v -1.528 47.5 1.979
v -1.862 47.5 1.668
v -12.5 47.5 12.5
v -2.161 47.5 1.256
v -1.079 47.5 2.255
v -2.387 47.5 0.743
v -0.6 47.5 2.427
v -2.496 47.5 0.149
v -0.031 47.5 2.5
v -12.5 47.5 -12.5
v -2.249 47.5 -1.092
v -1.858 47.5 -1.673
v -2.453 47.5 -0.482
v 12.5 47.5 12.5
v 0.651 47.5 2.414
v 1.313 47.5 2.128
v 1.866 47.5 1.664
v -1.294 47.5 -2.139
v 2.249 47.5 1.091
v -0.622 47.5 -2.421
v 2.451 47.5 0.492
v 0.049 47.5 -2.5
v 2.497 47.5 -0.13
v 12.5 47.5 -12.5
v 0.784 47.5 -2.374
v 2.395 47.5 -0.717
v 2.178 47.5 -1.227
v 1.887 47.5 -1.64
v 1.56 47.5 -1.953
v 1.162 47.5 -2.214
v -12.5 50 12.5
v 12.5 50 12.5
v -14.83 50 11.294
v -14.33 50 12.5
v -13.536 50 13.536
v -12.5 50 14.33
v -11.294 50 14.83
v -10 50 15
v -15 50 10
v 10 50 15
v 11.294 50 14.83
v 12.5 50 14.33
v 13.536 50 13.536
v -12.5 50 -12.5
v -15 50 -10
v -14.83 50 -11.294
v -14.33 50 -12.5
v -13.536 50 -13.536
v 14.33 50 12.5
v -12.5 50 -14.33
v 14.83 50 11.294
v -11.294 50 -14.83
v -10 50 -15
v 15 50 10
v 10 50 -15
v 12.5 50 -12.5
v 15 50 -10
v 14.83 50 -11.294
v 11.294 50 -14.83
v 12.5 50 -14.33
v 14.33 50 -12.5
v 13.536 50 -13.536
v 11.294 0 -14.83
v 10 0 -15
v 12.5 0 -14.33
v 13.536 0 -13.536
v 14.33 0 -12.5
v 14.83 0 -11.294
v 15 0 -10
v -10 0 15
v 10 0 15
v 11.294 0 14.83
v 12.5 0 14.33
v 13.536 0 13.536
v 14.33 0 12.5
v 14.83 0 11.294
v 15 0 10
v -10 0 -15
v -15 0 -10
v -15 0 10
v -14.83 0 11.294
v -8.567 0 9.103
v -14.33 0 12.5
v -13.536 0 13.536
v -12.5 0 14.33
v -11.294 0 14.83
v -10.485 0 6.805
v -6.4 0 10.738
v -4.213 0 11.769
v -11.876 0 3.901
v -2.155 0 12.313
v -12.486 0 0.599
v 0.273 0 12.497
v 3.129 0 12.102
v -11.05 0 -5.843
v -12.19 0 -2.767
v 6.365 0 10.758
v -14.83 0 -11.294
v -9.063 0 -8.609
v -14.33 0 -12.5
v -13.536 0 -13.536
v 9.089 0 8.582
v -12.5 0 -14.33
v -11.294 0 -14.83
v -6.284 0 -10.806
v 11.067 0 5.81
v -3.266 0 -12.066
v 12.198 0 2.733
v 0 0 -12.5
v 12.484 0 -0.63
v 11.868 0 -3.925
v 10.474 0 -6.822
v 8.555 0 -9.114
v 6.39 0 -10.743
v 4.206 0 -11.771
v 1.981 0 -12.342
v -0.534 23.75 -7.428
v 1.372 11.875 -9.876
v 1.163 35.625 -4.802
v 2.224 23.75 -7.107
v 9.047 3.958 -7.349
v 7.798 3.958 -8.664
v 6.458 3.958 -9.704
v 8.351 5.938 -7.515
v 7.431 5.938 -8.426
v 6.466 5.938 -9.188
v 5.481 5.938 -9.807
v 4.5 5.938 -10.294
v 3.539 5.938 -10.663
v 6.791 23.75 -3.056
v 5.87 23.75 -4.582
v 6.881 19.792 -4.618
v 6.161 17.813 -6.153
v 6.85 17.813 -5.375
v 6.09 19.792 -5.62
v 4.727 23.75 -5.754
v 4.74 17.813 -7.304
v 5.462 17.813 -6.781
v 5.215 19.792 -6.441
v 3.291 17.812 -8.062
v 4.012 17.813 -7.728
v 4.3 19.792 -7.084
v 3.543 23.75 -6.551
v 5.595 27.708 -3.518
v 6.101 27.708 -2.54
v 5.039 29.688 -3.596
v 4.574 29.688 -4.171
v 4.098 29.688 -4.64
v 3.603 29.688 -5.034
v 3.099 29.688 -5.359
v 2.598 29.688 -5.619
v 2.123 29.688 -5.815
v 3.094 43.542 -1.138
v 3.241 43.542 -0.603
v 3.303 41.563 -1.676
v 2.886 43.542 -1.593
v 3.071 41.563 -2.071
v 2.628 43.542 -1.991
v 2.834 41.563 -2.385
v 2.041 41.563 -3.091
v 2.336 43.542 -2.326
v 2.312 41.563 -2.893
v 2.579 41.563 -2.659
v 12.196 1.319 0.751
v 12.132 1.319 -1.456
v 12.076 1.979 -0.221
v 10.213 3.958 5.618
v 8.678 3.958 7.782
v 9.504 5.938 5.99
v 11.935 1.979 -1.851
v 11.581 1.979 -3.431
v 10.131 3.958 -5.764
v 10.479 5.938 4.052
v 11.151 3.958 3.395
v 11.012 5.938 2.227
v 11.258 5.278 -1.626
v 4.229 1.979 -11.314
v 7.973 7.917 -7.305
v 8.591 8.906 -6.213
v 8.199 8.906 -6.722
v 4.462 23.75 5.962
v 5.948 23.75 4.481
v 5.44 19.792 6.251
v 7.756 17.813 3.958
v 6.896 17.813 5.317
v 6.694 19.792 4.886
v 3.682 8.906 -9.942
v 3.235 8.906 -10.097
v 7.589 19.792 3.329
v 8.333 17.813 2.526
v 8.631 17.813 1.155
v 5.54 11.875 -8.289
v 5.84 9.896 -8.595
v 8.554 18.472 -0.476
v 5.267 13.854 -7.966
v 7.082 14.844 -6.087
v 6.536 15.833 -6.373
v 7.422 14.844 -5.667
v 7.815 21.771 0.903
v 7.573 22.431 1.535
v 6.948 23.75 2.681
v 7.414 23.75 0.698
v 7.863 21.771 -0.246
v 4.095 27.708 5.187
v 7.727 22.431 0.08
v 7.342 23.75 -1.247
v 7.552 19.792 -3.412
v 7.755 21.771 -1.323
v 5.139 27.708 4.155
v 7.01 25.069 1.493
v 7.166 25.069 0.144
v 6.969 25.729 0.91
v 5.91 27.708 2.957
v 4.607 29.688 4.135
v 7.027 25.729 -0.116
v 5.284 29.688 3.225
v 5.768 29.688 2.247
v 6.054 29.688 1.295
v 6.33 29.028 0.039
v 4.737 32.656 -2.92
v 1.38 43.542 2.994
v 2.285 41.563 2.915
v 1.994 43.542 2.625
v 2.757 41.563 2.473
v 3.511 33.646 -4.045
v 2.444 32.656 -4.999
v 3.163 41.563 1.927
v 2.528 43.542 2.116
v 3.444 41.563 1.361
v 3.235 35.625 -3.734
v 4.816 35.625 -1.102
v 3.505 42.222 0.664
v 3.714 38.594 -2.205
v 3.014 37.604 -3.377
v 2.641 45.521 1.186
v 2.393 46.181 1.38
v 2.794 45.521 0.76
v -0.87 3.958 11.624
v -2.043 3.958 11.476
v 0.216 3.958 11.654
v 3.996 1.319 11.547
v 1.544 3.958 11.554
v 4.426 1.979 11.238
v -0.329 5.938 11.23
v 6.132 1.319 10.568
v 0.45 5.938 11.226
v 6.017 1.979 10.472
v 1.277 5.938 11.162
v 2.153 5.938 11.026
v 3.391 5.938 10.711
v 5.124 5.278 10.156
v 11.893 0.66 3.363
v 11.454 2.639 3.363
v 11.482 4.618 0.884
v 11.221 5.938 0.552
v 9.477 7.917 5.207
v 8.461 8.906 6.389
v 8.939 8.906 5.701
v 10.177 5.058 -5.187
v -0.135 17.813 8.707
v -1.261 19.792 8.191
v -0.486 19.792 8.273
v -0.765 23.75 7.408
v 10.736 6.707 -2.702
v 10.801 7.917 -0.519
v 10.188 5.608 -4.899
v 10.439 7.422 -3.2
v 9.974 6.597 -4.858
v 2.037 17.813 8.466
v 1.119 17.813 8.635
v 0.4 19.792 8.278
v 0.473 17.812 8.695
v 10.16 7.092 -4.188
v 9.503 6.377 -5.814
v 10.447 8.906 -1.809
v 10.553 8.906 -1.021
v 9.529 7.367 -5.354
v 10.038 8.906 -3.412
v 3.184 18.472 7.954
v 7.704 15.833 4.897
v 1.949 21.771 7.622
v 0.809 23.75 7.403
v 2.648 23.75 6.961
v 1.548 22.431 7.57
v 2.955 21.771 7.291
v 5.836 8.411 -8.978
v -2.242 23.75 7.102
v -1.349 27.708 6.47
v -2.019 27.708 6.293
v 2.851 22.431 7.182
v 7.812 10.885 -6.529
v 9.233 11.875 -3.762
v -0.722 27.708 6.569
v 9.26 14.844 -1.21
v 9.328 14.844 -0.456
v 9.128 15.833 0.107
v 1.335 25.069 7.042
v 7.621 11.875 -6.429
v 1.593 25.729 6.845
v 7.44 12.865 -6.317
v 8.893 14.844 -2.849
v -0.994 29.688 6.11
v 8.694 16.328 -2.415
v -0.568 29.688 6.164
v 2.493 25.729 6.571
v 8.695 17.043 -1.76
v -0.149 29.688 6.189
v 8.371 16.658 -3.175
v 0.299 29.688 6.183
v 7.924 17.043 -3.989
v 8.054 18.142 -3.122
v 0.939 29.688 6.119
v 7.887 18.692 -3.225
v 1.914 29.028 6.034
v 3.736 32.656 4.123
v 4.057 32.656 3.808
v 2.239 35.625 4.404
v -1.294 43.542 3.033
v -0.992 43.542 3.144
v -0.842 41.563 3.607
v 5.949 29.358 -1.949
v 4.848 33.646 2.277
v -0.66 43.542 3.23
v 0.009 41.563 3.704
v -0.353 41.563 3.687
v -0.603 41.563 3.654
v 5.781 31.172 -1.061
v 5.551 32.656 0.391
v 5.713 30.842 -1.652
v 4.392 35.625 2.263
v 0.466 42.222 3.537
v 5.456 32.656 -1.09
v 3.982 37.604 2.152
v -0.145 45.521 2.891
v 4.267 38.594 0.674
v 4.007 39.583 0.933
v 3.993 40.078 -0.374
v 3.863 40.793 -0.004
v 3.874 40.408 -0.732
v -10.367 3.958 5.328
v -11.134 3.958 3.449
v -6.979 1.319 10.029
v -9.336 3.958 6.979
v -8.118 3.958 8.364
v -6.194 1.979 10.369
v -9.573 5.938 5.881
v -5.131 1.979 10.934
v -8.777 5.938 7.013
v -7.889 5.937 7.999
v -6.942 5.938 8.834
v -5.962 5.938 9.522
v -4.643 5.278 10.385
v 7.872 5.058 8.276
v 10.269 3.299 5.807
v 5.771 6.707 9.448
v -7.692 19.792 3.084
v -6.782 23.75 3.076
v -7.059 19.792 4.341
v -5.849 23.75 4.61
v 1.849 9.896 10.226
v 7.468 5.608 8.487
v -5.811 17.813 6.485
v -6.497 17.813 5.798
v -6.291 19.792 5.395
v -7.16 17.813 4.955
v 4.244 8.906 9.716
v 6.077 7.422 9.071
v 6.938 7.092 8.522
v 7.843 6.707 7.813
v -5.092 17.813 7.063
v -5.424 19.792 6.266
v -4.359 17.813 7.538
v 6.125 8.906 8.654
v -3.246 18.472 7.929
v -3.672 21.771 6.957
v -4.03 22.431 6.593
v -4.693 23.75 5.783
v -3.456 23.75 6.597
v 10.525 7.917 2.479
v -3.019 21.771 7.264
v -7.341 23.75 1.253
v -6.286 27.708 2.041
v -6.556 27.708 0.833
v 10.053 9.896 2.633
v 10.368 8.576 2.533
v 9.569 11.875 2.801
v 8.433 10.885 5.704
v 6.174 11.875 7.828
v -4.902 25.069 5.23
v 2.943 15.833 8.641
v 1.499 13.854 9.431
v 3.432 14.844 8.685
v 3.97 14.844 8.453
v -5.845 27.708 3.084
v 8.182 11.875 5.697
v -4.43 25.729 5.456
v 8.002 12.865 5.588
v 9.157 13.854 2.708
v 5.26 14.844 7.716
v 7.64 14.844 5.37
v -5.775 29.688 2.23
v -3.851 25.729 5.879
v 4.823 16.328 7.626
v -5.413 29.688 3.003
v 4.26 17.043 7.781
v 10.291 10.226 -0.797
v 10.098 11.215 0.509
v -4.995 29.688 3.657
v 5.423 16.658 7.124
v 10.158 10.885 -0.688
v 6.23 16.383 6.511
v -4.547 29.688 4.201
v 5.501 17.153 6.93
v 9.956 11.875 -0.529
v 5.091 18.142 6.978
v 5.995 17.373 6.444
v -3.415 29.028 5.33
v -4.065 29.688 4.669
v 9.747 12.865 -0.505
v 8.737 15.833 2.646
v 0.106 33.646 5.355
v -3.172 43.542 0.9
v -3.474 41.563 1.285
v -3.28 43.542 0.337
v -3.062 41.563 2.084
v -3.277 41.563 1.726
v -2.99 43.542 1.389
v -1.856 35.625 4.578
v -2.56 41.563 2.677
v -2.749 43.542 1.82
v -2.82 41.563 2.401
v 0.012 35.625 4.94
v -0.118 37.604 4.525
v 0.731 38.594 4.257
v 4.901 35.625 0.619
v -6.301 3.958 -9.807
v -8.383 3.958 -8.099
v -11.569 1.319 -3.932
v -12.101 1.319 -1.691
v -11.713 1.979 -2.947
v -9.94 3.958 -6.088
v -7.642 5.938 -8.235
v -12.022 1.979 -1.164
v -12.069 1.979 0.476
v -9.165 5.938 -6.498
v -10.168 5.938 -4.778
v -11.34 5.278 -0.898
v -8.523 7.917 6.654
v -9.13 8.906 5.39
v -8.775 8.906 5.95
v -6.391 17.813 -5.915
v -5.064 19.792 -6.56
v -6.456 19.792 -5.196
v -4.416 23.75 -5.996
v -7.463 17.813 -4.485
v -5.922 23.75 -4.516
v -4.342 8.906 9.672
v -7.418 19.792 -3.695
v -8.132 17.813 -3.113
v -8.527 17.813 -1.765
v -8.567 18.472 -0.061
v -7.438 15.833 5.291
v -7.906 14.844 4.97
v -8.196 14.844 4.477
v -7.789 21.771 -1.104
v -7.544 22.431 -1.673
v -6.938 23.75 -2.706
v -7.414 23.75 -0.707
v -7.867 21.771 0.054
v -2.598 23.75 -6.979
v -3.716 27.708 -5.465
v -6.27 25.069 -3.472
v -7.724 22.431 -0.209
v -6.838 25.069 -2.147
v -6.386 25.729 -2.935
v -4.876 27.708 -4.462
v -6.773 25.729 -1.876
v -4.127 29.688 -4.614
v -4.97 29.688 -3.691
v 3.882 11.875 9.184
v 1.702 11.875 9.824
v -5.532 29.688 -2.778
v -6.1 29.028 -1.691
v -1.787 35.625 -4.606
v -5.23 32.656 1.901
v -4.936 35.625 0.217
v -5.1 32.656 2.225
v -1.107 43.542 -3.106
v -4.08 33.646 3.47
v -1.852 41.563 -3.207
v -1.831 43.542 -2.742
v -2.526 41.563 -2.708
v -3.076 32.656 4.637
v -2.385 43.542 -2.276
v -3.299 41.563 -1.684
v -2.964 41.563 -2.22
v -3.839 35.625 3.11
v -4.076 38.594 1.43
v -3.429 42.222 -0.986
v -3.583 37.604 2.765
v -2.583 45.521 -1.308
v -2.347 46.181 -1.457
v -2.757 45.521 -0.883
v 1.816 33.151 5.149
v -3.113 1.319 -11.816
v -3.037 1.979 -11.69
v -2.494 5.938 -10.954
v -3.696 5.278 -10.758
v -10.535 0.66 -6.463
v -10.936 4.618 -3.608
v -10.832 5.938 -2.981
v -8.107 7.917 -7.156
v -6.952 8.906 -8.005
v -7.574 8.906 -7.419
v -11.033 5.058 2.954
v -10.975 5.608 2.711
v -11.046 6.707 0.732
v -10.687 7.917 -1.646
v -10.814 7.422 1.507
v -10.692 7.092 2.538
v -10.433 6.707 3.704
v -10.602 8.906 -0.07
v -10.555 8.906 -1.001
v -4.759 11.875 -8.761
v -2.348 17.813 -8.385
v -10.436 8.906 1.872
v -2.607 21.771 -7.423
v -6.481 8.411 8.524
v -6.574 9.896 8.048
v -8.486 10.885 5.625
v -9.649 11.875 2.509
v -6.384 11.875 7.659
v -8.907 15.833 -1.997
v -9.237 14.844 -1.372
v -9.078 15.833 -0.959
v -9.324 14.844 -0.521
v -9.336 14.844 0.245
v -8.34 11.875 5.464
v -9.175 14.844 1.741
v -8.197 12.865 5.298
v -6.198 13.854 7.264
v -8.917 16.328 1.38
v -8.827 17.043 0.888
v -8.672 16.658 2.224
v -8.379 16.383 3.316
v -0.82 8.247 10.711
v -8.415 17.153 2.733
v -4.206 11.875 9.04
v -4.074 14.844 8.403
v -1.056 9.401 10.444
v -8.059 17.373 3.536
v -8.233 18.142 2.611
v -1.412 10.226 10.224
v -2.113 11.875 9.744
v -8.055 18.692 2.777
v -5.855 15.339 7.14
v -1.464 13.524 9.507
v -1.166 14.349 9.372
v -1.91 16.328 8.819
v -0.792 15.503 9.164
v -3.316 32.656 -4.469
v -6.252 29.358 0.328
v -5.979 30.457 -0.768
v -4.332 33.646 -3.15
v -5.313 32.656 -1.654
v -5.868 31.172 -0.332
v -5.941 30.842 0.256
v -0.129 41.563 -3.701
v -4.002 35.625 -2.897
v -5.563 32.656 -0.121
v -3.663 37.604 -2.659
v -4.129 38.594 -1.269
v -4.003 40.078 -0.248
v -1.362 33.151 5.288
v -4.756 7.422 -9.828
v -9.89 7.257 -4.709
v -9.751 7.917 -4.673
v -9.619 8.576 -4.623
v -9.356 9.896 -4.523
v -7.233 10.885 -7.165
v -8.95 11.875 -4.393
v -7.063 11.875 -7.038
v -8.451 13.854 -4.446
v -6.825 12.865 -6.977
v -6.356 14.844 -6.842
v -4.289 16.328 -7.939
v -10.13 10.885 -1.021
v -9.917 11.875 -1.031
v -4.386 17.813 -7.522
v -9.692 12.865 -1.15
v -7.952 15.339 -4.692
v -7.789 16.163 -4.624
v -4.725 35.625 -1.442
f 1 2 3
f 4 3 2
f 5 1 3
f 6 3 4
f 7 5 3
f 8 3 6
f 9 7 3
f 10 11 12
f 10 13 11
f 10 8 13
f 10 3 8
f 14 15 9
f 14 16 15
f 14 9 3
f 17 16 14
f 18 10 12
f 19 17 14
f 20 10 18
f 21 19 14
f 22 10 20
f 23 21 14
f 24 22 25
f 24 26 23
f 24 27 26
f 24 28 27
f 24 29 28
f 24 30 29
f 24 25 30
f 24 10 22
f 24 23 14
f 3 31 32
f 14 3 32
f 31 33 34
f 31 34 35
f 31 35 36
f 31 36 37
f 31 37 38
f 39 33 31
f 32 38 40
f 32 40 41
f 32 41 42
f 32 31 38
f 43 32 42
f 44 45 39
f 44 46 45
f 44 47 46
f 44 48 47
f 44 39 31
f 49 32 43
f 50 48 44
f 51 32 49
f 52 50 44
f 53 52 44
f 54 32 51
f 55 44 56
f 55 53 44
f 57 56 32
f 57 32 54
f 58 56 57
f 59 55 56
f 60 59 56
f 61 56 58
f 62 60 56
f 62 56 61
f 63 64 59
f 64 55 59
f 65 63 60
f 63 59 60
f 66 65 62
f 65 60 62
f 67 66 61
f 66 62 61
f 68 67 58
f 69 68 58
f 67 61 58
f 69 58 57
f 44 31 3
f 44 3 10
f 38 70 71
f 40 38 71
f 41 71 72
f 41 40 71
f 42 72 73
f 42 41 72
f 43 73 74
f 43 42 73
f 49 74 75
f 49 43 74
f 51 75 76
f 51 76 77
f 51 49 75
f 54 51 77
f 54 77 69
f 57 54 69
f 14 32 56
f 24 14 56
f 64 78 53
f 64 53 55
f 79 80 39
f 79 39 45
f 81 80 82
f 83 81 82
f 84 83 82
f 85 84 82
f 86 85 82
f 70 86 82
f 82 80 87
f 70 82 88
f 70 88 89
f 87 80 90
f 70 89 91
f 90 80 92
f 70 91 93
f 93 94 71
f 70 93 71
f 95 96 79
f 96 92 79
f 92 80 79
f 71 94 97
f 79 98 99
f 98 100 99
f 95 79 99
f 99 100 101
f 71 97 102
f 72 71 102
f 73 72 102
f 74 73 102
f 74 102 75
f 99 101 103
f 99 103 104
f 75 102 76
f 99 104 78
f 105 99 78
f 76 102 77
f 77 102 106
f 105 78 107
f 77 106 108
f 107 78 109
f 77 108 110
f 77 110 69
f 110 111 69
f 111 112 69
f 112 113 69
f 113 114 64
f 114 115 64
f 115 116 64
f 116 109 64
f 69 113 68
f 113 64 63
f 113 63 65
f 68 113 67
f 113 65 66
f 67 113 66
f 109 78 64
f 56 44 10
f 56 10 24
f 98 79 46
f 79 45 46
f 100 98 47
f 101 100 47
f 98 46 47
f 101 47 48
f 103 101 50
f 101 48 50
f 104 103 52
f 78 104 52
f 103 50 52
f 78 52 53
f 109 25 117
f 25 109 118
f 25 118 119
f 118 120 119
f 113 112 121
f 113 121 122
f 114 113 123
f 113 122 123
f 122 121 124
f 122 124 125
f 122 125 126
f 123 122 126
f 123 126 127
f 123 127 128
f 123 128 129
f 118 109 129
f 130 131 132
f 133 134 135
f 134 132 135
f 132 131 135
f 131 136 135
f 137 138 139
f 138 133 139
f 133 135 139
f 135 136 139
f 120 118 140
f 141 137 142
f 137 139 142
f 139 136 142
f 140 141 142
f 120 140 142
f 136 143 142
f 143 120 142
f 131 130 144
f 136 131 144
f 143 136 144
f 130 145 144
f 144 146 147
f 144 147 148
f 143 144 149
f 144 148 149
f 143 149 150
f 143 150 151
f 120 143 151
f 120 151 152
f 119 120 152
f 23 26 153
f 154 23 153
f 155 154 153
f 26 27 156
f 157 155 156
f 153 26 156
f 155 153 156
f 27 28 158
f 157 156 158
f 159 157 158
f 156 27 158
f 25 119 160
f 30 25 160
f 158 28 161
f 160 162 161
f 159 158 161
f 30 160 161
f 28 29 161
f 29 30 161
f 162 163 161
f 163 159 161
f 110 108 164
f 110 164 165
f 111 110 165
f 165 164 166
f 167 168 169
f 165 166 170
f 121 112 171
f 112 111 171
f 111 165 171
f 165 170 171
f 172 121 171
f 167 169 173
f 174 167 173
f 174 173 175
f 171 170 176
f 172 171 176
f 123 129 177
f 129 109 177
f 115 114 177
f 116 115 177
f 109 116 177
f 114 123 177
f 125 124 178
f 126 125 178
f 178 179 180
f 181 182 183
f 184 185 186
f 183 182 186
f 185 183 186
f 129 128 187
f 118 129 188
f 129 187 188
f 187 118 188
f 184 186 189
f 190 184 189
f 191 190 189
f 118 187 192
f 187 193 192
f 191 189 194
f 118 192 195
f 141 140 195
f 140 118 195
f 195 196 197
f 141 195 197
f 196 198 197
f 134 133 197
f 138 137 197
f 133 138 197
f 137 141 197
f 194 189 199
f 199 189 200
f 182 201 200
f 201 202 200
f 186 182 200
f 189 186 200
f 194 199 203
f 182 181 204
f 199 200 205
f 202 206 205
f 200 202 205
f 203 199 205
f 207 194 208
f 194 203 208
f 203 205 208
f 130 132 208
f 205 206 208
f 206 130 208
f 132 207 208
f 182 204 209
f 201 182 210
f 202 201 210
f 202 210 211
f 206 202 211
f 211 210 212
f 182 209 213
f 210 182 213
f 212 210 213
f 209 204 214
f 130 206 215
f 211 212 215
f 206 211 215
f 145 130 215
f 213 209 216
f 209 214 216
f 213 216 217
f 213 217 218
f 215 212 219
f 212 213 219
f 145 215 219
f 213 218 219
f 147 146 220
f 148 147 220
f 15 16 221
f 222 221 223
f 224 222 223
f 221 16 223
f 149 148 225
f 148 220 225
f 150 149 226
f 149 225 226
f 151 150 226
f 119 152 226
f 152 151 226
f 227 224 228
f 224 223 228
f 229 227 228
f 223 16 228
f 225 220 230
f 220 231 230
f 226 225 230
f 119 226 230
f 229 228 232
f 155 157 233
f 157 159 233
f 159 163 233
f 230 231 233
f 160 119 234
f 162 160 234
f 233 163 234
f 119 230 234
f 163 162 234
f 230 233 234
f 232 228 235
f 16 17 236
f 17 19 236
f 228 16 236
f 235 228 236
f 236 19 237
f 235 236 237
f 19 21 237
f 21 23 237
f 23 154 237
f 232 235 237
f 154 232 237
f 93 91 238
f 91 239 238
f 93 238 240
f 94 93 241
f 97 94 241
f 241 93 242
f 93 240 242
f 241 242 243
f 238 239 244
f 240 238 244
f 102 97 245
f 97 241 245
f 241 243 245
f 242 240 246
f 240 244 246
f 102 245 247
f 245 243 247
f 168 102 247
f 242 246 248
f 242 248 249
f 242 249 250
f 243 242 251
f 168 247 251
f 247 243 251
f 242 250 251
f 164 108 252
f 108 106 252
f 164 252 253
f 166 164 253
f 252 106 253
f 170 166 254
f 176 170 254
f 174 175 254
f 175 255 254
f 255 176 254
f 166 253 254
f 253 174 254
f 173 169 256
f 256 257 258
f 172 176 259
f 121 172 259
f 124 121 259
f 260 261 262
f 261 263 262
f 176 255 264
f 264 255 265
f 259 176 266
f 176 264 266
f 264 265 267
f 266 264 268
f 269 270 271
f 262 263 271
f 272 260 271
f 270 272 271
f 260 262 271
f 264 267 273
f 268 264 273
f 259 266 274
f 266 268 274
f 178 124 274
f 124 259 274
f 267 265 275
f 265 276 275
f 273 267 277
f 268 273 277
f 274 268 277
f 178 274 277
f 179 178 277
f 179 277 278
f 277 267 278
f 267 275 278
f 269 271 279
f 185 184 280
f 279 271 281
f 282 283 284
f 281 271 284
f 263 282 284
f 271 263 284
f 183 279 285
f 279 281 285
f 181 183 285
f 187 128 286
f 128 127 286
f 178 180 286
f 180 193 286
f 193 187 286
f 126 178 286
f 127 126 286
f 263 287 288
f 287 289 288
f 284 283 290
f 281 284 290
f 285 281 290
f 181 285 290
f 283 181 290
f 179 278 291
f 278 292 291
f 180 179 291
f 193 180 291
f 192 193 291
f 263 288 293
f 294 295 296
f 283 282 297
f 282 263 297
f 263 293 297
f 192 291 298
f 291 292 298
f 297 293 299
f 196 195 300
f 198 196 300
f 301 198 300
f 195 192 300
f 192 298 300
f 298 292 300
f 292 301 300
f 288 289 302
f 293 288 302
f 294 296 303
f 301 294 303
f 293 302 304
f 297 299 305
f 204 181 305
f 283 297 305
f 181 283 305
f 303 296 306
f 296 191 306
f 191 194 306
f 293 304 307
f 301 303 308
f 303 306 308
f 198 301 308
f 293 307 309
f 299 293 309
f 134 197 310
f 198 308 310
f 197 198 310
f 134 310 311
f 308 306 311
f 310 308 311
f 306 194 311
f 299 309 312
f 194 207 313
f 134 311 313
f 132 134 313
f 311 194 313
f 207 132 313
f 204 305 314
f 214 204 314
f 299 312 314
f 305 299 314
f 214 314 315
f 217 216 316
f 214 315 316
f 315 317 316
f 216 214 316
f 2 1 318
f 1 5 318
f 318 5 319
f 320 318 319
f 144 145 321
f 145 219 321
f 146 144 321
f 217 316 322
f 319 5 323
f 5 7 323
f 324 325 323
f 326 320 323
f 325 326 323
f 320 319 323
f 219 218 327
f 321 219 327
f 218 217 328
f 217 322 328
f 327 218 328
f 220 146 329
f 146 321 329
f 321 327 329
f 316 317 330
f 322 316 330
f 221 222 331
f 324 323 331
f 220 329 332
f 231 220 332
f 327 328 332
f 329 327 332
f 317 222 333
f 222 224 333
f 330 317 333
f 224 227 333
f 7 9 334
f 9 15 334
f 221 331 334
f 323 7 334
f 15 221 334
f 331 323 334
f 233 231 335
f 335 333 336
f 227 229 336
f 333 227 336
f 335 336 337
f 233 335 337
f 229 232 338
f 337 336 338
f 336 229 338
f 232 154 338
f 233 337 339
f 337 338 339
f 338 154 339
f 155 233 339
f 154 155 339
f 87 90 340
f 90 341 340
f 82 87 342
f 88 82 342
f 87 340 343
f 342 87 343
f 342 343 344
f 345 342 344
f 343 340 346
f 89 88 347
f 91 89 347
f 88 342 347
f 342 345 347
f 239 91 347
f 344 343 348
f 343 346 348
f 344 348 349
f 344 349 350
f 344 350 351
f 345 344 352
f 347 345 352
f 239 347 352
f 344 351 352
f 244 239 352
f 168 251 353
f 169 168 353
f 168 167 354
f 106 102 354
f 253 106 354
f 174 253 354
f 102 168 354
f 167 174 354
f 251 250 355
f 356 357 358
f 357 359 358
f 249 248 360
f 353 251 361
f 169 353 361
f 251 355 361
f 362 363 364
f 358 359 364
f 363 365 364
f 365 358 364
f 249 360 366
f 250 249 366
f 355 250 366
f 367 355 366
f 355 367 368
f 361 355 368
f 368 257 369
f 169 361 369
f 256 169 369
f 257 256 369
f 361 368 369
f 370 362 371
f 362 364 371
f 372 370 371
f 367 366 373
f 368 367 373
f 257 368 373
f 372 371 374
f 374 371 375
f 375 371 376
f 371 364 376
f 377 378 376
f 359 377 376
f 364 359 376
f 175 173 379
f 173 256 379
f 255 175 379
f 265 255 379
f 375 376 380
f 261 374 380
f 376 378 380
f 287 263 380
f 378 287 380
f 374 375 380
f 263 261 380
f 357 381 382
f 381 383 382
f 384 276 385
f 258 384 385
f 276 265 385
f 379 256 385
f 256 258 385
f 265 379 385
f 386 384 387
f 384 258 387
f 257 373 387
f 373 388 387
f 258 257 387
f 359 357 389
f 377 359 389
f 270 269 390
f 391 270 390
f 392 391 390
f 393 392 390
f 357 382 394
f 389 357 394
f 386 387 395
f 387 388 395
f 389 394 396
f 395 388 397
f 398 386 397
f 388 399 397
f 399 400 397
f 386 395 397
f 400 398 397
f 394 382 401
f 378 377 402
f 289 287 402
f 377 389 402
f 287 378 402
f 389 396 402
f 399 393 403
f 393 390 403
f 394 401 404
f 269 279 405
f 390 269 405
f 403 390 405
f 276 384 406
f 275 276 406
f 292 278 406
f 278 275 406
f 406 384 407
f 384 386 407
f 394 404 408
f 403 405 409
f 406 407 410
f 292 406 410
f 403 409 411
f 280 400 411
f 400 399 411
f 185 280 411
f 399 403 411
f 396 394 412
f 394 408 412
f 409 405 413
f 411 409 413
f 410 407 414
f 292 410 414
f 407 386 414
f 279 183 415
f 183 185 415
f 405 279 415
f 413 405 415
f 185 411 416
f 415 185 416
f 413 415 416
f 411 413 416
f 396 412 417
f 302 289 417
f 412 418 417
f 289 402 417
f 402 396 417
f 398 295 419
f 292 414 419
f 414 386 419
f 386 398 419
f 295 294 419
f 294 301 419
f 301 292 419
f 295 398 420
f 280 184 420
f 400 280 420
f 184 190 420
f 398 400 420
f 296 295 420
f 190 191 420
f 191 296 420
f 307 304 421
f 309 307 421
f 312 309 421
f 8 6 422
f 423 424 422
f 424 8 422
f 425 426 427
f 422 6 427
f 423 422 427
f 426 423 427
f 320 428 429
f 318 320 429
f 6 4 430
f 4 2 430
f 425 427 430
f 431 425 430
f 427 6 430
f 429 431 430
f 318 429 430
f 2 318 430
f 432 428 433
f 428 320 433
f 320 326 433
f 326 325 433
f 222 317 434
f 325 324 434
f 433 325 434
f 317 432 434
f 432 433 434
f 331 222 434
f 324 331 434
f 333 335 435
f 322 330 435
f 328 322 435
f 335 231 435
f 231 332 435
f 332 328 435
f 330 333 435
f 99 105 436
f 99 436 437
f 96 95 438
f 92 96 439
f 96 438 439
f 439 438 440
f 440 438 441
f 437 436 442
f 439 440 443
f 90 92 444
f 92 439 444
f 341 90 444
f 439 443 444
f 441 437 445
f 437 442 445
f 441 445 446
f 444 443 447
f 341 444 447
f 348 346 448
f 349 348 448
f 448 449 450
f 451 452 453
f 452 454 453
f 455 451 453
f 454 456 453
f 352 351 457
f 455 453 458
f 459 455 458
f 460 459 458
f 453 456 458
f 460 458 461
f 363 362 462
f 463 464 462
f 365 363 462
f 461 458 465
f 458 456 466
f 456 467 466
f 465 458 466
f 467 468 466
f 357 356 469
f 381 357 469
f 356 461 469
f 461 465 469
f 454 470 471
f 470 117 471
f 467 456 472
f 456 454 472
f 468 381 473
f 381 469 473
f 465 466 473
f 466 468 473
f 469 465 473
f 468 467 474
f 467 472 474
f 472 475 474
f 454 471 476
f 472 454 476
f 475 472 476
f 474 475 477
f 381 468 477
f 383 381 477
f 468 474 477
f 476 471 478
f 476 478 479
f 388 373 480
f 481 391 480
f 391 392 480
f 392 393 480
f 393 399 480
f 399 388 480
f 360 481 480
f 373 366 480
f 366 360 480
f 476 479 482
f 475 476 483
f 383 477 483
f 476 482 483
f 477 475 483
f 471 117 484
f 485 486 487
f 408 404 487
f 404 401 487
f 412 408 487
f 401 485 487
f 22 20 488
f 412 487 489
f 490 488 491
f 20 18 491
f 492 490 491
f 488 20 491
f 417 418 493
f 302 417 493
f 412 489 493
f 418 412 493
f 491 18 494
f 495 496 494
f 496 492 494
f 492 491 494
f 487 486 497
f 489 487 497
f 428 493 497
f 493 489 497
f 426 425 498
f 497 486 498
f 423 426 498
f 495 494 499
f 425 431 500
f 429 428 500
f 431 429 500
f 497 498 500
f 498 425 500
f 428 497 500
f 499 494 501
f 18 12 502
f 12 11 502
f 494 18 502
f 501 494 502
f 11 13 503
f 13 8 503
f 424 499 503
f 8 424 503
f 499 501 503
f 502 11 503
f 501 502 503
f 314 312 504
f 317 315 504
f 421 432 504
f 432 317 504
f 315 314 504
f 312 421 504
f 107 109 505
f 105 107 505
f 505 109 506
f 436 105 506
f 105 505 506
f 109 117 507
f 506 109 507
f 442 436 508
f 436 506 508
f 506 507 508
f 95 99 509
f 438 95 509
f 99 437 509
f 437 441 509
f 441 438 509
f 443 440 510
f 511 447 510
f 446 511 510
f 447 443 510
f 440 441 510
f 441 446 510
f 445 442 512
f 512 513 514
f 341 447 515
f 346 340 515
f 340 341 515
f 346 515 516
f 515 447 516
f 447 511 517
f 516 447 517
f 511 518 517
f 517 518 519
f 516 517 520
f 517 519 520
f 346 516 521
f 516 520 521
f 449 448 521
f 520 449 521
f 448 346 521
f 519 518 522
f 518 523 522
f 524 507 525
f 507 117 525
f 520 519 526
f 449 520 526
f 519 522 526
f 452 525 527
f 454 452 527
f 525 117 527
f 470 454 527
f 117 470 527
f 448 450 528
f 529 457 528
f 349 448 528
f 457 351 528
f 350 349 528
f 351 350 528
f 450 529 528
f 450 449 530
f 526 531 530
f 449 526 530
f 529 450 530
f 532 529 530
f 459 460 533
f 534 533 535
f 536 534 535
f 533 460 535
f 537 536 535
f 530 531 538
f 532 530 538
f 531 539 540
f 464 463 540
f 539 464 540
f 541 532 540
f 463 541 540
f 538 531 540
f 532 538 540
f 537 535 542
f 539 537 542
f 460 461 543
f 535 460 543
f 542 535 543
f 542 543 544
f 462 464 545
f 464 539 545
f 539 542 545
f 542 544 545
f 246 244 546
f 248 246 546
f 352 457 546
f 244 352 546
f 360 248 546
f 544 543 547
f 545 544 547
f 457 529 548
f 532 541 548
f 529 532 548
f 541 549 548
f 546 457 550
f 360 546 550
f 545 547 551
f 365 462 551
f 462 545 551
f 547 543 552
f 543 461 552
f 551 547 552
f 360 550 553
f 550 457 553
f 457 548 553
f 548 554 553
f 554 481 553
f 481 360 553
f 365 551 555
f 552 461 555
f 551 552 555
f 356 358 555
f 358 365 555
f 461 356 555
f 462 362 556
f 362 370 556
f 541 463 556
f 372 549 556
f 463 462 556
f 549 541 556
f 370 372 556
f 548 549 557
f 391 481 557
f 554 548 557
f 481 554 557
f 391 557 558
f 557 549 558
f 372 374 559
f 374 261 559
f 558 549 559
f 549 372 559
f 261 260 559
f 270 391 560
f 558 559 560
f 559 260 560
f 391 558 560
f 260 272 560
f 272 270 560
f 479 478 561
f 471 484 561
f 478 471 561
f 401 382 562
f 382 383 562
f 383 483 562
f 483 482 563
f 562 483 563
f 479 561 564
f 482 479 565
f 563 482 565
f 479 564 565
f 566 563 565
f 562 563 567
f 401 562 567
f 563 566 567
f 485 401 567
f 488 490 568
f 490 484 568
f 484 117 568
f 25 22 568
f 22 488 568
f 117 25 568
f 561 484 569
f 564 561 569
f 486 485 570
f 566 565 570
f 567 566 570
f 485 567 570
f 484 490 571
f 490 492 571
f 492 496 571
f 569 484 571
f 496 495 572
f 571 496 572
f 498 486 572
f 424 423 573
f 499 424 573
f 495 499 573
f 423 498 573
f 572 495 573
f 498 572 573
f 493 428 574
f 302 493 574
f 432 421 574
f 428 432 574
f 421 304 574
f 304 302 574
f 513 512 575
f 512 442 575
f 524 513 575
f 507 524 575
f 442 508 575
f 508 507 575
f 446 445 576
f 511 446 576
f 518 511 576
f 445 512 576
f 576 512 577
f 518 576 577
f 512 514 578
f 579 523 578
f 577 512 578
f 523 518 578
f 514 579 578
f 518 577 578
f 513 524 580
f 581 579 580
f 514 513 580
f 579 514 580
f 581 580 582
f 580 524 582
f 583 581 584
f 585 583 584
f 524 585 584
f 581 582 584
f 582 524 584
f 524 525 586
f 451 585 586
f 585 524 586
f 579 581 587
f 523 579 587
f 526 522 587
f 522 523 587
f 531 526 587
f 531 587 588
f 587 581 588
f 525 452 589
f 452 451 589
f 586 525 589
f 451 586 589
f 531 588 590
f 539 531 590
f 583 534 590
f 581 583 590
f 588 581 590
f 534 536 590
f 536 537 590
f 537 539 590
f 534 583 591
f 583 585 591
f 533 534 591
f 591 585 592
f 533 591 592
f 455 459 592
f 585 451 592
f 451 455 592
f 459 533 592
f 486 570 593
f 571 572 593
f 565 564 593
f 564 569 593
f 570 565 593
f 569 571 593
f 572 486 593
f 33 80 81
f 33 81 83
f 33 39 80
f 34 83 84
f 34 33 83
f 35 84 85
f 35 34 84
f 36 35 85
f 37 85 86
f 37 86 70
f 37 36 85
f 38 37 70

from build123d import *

# Parameters (mm, degrees)
SKETCH2_W           = 30
SKETCH2_H           = 30
BOSS_EXTRUDE1_DEPTH = 50
SKETCH3_W           = 25
SKETCH3_H           = 25
CUT_EXTRUDE1_DEPTH  = 2.5
FILLET1_R           = 5


with BuildPart() as part:
    # Sketch2 → Boss-Extrude1 (new body)
    with BuildSketch(Plane(origin=(0, 0, 0), x_dir=(1, 0, 0), z_dir=(0, 1, 0))):
        Rectangle(SKETCH2_W, SKETCH2_H)
    extrude(amount=BOSS_EXTRUDE1_DEPTH)

    # Sketch3 → Cut-Extrude1 (cut)
    with BuildSketch(Plane(origin=(0, 50, 0), x_dir=(1, 0, 0), z_dir=(0, 1, 0))):
        Rectangle(SKETCH3_W, SKETCH3_H)
    extrude(amount=-CUT_EXTRUDE1_DEPTH, mode=Mode.SUBTRACT)

    # Fillet1
    fillet1_edges = [part.edges().sort_by_distance(p)[0] for p in [
        (15, 25, 15),
        (-15, 25, 15),
        (-15, 25, -15),
        (15, 25, -15),
    ]]
    fillet(fillet1_edges, radius=FILLET1_R)

    # Cut-Loft2: read off the stored shape, not the designer's step
    # Cut-Loft2: loft between two sections, ruled curve by curve
    cut_loft2_from = [
        Edge.make_bspline([(0, 0, -12.5), (-25, 0, -12.5), (-25, 0, 12.5), (0, 0, 12.5), (25, 0, 12.5), (25, 0, -12.5), (0, 0, -12.5)], [0, 0, 0, 0, 0.5, 0.5, 0.5, 1, 1, 1, 1], 3, [1, 0.333333333, 0.333333333, 1, 0.333333333, 0.333333333, 1]),
    ]
    cut_loft2_to = [
        Edge.make_bspline([(0.784484005, 47.5, -2.373728048), (-3.962972092, 47.5, -3.942696057), (-5.531940101, 47.5, 0.804760039), (-0.784484005, 47.5, 2.373728048), (3.962972092, 47.5, 3.942696057), (5.531940101, 47.5, -0.804760039), (0.784484005, 47.5, -2.373728048)], [0, 0, 0, 0, 0.5, 0.5, 0.5, 1, 1, 1, 1], 3, [1, 0.333333333, 0.333333333, 1, 0.333333333, 0.333333333, 1]),
    ]
    cut_loft2 = Solid(Shell([*[Face.make_surface_from_curves(cut_loft2_from[k], cut_loft2_to[k]) for k in range(1)], Face(Wire(cut_loft2_from)), Face(Wire(cut_loft2_to))]))
    add(cut_loft2, mode=Mode.SUBTRACT)


solid = part.part
